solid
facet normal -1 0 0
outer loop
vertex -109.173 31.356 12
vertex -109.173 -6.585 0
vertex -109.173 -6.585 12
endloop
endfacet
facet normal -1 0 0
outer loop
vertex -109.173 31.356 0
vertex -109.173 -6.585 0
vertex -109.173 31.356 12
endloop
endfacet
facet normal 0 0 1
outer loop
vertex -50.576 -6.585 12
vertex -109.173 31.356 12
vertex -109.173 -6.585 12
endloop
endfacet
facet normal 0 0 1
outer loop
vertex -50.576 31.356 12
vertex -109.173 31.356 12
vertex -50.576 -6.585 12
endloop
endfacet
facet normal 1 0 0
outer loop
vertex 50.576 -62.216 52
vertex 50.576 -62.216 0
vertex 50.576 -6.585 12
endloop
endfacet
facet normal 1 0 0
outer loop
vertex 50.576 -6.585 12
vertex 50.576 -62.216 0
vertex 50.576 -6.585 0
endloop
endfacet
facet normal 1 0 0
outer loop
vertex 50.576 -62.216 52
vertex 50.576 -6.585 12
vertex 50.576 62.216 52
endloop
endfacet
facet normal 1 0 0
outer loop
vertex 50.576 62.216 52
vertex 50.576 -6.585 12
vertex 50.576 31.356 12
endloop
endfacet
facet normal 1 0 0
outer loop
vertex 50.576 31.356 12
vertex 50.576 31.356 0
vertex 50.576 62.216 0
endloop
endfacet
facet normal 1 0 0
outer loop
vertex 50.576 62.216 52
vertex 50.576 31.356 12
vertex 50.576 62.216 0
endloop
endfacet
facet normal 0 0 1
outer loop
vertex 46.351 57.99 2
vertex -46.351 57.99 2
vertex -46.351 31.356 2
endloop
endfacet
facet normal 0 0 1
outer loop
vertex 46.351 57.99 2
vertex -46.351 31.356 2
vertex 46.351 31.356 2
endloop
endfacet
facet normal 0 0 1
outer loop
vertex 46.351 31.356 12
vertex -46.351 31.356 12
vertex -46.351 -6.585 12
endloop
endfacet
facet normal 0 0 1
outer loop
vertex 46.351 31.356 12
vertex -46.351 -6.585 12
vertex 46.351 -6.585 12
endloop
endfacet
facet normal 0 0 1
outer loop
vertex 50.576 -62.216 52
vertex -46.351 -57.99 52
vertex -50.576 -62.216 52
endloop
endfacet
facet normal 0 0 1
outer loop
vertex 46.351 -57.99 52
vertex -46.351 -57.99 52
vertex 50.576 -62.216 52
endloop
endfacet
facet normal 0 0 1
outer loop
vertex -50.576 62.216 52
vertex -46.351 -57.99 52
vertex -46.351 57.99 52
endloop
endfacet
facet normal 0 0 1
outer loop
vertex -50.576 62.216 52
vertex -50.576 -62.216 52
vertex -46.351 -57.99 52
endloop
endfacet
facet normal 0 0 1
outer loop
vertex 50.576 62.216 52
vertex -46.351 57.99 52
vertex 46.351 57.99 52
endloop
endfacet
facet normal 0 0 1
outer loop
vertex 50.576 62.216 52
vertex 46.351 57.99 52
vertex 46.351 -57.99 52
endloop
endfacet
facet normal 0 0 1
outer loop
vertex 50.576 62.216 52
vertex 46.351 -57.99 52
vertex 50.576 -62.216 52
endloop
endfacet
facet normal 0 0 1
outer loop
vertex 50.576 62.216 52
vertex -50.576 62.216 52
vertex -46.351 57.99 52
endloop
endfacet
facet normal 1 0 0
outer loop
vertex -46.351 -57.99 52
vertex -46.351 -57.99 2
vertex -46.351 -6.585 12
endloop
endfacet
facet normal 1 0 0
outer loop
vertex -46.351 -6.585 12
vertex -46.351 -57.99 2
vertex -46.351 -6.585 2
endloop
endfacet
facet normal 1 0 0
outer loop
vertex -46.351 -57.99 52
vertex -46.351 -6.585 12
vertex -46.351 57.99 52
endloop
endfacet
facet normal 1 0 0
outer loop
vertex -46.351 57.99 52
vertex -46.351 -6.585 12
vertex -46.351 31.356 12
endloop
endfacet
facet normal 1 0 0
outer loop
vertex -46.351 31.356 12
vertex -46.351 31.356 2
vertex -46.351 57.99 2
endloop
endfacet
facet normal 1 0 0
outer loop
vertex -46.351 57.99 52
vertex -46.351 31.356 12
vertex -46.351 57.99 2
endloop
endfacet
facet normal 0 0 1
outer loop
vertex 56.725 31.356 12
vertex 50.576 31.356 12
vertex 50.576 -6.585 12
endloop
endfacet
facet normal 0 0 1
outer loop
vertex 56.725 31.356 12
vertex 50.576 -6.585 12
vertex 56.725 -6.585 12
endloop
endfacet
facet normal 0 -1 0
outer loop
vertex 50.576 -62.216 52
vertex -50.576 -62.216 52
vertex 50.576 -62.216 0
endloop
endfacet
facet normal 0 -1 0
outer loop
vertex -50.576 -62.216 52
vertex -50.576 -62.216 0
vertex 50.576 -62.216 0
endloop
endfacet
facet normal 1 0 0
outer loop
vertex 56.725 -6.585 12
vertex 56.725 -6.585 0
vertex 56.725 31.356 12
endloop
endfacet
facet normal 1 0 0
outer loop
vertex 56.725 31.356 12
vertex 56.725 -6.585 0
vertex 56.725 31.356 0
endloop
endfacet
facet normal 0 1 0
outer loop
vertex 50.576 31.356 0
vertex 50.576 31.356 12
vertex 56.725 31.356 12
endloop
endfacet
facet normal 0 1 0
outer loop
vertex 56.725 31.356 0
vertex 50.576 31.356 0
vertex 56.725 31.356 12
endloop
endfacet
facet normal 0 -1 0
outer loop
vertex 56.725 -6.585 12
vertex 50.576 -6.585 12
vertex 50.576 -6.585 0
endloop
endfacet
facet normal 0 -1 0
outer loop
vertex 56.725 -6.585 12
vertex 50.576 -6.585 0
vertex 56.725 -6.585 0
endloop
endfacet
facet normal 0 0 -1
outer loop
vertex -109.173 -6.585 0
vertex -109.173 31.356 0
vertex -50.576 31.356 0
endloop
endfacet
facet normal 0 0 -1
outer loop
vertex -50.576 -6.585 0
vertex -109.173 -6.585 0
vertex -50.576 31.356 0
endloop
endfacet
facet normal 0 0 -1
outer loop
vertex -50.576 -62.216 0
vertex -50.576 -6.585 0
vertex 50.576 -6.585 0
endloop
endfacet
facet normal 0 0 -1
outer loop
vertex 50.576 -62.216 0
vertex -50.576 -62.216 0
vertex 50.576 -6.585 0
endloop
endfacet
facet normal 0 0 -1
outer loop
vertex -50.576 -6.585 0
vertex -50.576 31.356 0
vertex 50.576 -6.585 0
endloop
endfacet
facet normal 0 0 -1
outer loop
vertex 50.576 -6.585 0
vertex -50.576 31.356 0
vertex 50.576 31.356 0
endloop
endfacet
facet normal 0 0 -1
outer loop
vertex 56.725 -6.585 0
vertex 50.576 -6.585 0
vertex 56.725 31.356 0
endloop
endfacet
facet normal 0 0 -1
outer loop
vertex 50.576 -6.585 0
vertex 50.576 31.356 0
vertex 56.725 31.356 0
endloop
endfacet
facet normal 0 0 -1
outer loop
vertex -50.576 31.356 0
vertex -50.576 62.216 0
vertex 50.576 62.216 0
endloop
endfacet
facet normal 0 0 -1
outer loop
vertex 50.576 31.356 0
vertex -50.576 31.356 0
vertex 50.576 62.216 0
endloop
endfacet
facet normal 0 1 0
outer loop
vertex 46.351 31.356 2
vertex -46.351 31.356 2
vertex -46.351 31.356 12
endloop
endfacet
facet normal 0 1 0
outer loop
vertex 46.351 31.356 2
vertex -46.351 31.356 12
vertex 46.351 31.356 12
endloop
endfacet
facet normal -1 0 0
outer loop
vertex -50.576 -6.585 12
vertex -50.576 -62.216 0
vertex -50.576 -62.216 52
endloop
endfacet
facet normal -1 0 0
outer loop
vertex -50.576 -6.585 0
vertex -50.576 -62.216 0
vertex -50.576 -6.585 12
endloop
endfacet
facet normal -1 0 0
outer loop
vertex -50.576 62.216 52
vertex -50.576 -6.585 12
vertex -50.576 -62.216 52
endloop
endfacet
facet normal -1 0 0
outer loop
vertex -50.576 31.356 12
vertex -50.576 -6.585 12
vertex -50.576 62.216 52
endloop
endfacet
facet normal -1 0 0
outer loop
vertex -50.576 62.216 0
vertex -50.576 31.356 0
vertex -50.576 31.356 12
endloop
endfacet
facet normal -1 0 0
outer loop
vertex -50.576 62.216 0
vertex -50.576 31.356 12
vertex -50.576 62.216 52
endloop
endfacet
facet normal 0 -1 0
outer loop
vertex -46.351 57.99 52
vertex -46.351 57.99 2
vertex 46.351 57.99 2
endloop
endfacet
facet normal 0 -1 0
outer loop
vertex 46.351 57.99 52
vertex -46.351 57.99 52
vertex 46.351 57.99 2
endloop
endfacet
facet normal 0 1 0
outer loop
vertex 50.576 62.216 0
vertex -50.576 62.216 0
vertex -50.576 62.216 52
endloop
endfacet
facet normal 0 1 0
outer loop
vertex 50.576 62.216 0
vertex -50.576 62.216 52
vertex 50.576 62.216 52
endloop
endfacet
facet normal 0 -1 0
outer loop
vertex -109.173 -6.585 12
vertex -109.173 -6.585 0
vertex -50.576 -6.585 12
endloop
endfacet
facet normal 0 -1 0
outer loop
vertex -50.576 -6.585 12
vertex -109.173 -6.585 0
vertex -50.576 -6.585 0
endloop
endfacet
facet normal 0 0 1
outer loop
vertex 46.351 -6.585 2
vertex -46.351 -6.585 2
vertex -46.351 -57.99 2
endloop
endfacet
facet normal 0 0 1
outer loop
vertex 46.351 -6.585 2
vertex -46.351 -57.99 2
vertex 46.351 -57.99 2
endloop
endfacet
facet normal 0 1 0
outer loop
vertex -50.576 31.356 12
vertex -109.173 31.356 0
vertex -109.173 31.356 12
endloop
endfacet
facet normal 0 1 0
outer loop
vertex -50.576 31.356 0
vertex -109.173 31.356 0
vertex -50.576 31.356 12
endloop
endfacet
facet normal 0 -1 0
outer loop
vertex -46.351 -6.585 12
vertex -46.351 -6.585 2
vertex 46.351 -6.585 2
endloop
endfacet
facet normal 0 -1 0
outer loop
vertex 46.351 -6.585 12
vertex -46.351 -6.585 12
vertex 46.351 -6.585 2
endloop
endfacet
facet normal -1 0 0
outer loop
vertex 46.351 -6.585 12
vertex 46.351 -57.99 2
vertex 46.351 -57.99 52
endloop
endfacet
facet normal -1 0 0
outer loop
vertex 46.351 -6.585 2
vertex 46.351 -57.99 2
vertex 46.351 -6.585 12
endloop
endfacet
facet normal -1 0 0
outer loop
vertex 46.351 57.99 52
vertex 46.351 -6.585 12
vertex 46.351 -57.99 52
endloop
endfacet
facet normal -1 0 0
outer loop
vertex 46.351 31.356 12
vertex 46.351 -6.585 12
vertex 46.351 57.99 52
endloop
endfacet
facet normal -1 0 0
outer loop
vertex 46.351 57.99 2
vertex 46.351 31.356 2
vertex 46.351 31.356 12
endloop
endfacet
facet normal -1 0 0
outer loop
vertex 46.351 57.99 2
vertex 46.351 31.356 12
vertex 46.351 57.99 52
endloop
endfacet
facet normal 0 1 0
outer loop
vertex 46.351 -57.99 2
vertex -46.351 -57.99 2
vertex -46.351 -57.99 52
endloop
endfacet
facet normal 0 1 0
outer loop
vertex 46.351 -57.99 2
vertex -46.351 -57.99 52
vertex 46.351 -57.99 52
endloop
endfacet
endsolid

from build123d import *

# Parameters (mm, degrees)
F0_W     = 101.152622
F0_H     = 124.431356
F1_DEPTH = 2
F2_W     = 101.152622
F2_H     = 124.431356
F2_W_2   = 92.701234
F2_H_2   = 115.979962
F3_DEPTH = 50
F4_W     = 165.897682
F4_H     = 37.940726
F5_DEPTH = 12


with BuildPart() as f1:
    # F0 (on Top) → F1 (new body)
    with BuildSketch(Plane.XY):
        Rectangle(F0_W, F0_H)
    extrude(amount=F1_DEPTH)

    # F2 (on face) → F3 (join)
    with BuildSketch(Plane.XY.offset(2)):
        Rectangle(F2_W, F2_H)
        Rectangle(F2_W_2, F2_H_2, mode=Mode.SUBTRACT)
    extrude(amount=F3_DEPTH)

    # F4 (on Top) → F5 (join)
    with BuildSketch(Plane.XY):
        with Locations((-26.223734, 12.385411)):
            Rectangle(F4_W, F4_H)
    extrude(amount=F5_DEPTH)


solid = f1.part
